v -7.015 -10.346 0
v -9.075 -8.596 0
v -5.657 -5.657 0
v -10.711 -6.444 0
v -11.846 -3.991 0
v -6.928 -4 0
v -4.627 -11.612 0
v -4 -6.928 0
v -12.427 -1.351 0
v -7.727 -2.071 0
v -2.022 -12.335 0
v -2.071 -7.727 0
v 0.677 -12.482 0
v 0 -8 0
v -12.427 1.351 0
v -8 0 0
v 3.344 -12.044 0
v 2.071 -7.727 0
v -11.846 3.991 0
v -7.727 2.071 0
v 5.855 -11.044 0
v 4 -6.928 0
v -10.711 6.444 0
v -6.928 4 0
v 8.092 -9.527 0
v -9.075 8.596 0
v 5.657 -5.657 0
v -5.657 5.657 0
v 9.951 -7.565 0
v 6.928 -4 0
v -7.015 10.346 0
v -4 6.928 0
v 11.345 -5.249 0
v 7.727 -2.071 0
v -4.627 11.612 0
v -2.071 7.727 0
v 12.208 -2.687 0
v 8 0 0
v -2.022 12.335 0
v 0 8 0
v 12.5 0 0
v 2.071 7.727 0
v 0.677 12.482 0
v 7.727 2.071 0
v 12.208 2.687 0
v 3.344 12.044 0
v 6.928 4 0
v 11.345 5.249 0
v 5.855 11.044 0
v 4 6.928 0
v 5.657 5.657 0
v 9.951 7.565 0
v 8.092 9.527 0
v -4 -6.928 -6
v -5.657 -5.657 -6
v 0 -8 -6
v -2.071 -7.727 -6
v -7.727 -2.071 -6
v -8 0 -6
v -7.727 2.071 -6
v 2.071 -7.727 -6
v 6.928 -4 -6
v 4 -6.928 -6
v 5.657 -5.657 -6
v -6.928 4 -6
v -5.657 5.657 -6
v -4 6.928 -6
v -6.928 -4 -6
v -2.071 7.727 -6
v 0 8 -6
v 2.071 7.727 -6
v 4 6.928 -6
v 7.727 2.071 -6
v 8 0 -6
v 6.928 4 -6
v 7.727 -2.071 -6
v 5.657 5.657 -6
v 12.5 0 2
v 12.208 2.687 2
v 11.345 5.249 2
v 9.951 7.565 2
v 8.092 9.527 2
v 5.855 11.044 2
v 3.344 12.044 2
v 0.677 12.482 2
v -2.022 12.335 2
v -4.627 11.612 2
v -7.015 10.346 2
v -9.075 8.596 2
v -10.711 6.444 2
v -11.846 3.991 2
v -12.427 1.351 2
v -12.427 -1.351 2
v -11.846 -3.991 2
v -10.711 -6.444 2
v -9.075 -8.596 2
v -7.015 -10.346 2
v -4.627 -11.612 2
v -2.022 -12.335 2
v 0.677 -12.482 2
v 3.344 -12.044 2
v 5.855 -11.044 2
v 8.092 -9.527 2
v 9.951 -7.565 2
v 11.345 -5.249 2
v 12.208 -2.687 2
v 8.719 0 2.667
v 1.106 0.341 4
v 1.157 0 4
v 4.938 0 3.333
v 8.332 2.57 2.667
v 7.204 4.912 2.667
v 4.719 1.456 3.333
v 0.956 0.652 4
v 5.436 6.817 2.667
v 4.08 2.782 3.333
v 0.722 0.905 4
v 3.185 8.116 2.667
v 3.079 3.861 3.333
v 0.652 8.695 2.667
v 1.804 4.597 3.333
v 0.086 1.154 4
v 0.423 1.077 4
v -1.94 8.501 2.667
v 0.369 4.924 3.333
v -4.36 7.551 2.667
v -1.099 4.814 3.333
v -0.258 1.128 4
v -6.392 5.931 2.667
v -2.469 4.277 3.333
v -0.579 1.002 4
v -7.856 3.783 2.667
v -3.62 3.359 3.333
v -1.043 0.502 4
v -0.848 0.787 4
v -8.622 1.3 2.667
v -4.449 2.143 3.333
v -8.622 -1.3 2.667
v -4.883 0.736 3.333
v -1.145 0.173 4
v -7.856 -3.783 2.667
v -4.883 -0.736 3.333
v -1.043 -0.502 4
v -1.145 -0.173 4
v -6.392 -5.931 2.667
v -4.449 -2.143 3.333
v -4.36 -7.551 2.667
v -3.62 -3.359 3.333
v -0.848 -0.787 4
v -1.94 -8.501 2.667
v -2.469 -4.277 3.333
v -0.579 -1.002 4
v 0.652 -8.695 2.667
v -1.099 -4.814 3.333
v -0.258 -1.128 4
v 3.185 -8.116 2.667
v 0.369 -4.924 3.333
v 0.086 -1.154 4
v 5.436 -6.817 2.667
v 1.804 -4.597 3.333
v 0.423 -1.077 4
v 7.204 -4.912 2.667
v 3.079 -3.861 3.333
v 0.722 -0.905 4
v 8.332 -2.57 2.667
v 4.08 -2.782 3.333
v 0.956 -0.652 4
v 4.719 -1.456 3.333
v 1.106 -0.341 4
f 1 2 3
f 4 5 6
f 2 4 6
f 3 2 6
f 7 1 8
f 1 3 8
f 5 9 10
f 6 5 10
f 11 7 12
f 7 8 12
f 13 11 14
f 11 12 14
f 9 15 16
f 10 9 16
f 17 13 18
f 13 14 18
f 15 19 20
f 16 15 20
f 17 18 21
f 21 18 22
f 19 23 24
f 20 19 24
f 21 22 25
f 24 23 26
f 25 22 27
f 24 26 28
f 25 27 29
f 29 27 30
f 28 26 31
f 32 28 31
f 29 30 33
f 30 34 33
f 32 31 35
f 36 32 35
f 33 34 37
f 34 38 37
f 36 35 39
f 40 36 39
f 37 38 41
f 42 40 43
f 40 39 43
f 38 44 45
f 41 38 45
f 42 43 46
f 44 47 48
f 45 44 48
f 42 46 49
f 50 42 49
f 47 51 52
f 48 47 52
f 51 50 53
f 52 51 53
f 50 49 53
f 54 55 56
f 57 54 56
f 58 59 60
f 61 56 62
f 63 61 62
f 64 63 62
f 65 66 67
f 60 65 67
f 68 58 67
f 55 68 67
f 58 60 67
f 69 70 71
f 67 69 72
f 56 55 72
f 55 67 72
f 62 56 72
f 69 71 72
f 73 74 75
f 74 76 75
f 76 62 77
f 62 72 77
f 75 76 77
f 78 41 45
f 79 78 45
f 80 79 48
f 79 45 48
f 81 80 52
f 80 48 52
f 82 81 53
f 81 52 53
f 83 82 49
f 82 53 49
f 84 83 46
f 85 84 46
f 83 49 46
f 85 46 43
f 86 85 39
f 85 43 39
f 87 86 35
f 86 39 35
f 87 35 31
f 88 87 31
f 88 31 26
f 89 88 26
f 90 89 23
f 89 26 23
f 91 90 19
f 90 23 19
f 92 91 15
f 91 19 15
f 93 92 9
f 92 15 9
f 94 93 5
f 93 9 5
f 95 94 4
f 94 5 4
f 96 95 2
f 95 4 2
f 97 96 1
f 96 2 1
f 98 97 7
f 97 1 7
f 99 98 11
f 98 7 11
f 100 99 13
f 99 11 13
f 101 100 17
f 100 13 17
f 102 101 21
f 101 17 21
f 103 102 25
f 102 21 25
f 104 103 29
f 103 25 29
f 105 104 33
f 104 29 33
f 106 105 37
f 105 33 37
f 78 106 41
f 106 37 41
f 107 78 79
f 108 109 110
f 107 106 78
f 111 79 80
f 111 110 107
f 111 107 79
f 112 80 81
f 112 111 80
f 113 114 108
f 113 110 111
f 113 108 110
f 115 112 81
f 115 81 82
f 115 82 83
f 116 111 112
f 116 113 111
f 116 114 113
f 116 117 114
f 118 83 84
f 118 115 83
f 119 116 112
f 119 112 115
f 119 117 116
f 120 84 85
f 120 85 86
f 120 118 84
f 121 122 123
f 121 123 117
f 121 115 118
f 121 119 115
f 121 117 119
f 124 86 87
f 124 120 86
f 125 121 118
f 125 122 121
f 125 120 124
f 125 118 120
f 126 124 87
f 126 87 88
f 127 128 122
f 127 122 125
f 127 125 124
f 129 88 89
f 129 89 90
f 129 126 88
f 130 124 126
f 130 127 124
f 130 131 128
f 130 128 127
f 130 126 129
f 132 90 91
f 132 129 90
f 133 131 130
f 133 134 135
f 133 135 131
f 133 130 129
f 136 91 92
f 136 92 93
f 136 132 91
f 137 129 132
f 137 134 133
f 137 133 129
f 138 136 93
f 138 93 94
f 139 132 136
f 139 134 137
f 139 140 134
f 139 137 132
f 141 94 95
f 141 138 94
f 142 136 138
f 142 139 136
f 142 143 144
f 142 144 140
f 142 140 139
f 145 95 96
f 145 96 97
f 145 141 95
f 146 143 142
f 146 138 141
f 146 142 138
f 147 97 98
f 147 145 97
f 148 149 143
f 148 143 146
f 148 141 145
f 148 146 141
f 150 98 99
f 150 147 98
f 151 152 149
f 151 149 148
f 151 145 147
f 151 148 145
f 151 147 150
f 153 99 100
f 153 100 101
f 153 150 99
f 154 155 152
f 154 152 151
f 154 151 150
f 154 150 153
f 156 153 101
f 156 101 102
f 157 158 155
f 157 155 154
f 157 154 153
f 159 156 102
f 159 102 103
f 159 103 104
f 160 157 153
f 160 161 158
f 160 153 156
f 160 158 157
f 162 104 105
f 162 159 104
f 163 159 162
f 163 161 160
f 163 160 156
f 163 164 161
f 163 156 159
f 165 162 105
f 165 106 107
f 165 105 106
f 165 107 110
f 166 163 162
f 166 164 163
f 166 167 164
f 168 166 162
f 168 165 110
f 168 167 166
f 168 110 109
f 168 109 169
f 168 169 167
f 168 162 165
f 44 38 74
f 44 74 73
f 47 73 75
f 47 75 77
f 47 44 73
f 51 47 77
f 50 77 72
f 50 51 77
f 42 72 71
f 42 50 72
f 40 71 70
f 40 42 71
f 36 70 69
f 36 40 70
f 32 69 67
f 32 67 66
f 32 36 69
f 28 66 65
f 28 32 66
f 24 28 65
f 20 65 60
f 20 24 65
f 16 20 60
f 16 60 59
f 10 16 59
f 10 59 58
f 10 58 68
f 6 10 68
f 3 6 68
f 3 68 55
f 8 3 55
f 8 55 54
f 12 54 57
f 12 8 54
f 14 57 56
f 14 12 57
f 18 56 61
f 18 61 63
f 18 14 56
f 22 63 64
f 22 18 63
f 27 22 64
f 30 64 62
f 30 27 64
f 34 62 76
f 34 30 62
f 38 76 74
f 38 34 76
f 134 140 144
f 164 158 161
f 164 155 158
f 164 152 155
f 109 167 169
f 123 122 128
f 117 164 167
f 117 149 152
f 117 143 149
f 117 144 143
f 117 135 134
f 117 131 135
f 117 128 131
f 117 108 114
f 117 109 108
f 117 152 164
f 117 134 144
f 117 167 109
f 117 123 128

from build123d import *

# Parameters (mm, degrees)
SKETCH1_R           = 8
BOSS_EXTRUDE2_DEPTH = 6
SKETCH5_R           = 12.5
BOSS_EXTRUDE3_DEPTH = 2
SKETCH6_R           = 12.5
BOSS_EXTRUDE4_DEPTH = 2
BOSS_EXTRUDE4_TAPER = 80


with BuildPart() as part:
    # Sketch1 → Boss-Extrude2 (new body)
    with BuildSketch(Plane.XY):
        Circle(SKETCH1_R)
    extrude(amount=-BOSS_EXTRUDE2_DEPTH)

    # Sketch5 → Boss-Extrude3 (add)
    with BuildSketch(Plane.XY):
        Circle(SKETCH5_R)
    extrude(amount=BOSS_EXTRUDE3_DEPTH)

    # Sketch6 → Boss-Extrude4 (add)
    with BuildSketch(Plane.XY.offset(2)):
        Circle(SKETCH6_R)
    extrude(amount=BOSS_EXTRUDE4_DEPTH, taper=BOSS_EXTRUDE4_TAPER)


solid = part.part
